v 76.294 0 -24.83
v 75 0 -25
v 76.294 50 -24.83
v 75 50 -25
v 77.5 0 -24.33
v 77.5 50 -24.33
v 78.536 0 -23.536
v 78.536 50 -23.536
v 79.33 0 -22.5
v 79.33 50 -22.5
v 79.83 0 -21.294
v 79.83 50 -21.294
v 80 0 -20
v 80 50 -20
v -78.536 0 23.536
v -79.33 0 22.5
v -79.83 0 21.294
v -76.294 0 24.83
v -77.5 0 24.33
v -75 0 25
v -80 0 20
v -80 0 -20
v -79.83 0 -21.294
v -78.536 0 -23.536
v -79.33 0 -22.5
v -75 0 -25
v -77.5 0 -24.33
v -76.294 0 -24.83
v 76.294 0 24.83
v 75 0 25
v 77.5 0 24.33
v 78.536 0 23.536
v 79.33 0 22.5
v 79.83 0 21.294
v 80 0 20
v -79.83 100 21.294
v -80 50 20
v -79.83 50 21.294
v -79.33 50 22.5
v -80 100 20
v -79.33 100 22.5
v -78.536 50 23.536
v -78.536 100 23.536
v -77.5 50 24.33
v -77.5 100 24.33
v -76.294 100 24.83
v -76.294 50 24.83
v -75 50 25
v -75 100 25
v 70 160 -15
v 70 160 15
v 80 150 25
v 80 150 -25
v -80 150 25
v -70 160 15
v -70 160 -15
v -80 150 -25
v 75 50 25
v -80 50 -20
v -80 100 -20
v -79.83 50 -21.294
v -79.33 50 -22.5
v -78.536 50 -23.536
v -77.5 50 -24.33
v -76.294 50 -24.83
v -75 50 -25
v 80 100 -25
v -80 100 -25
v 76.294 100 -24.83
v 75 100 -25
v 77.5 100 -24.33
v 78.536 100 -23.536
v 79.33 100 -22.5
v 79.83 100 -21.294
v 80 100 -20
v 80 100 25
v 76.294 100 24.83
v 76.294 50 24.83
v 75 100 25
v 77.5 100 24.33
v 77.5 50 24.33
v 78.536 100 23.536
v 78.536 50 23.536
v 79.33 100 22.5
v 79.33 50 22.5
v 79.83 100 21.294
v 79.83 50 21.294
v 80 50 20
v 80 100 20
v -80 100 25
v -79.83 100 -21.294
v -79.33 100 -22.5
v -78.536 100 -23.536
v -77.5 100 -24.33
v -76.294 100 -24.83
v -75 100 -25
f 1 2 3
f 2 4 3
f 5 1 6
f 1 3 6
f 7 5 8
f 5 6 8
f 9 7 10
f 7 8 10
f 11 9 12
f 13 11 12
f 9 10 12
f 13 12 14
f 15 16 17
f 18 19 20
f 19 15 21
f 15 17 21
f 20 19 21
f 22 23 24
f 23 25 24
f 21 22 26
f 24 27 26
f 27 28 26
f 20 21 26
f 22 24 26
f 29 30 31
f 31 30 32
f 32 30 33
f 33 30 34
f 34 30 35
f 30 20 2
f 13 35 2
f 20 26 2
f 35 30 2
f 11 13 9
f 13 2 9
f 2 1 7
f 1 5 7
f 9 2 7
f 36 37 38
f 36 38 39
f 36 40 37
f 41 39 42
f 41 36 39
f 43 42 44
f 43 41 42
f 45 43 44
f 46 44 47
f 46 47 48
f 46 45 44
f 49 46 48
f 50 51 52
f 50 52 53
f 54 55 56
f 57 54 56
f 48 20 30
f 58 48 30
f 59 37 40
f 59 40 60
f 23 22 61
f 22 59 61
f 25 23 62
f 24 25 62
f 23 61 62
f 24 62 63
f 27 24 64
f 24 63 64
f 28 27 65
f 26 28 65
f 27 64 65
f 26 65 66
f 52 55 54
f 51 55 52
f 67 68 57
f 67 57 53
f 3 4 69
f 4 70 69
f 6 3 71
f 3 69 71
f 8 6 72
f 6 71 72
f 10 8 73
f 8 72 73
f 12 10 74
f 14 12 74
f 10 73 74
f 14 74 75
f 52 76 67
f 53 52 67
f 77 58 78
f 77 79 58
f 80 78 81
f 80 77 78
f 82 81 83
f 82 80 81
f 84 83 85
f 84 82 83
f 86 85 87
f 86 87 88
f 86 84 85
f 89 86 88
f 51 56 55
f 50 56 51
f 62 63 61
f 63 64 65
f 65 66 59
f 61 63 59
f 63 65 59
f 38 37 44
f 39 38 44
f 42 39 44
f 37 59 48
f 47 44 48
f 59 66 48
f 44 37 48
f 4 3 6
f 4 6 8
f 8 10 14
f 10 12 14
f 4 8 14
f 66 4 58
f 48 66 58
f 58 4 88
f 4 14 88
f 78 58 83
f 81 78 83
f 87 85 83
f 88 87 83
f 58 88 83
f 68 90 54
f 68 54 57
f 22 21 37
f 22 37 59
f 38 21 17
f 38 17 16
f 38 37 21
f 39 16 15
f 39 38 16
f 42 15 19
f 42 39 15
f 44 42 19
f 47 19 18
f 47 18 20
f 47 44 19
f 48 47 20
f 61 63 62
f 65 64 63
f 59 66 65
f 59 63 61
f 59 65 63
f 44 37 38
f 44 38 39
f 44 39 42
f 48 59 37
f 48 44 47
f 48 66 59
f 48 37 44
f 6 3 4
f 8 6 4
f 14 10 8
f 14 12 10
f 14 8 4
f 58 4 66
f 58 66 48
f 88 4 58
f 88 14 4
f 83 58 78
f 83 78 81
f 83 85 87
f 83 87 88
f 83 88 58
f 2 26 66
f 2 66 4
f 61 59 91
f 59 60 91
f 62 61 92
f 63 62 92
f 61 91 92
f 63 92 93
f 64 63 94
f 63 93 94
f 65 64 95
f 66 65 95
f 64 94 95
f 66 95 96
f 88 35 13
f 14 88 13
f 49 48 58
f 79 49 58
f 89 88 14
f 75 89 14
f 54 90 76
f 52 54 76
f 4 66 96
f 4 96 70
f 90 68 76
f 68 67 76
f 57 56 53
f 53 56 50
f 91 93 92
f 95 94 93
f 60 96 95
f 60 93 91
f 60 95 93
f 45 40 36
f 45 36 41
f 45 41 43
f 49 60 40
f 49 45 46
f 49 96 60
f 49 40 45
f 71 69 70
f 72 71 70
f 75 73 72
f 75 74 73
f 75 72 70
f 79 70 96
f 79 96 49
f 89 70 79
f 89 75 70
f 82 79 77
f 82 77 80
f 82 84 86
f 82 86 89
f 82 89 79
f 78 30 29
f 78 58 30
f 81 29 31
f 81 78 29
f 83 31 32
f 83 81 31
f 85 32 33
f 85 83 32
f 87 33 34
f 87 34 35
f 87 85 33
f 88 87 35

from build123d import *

# Parameters (mm, degrees)
SKETCH1_W           = 160
SKETCH1_H           = 50
BOSS_EXTRUDE1_DEPTH = 160
CHAMFER1_SIZE       = 10
FILLET2_R           = 5
FILLET3_R           = 5


with BuildPart() as part:
    # Sketch1 → Boss-Extrude1 (new body)
    with BuildSketch(Plane(origin=(0, 0, 0), x_dir=(1, 0, 0), z_dir=(0, 1, 0))):
        Rectangle(SKETCH1_W, SKETCH1_H)
    extrude(amount=BOSS_EXTRUDE1_DEPTH)

    # Chamfer1
    chamfer1_edges = [part.edges().sort_by_distance(p)[0] for p in [
        (-80, 160, 0),
        (0, 160, 25),
        (80, 160, 0),
        (0, 160, -25),
    ]]
    chamfer(chamfer1_edges, length=CHAMFER1_SIZE)


with BuildPart() as body_2:
    # Split1: the piece on the far side of the plane
    add(part.part)
    split(bisect_by=Plane.ZX.offset(50), keep=Keep.BOTTOM)

    # Fillet2
    fillet2_edges = [body_2.edges().sort_by_distance(p)[0] for p in [
        (80, 25, 25),
        (-80, 25, 25),
        (-80, 25, -25),
        (80, 25, -25),
    ]]
    fillet(fillet2_edges, radius=FILLET2_R)


with BuildPart() as part_1:
    add(part.part)

    # Split1
    split(bisect_by=Plane.ZX.offset(50), keep=Keep.TOP)


with BuildPart() as body_3:
    # Split2: the piece on the far side of the plane
    add(part_1.part)
    split(bisect_by=Plane.ZX.offset(100), keep=Keep.BOTTOM)

    # Fillet3
    fillet3_edges = [body_3.edges().sort_by_distance(p)[0] for p in [
        (80, 75, 25),
        (-80, 75, 25),
        (-80, 75, -25),
        (80, 75, -25),
    ]]
    fillet(fillet3_edges, radius=FILLET3_R)


with BuildPart() as part_2:
    add(part_1.part)

    # Split2
    split(bisect_by=Plane.ZX.offset(100), keep=Keep.TOP)


solid = Compound([body_2.part, body_3.part, part_2.part])
